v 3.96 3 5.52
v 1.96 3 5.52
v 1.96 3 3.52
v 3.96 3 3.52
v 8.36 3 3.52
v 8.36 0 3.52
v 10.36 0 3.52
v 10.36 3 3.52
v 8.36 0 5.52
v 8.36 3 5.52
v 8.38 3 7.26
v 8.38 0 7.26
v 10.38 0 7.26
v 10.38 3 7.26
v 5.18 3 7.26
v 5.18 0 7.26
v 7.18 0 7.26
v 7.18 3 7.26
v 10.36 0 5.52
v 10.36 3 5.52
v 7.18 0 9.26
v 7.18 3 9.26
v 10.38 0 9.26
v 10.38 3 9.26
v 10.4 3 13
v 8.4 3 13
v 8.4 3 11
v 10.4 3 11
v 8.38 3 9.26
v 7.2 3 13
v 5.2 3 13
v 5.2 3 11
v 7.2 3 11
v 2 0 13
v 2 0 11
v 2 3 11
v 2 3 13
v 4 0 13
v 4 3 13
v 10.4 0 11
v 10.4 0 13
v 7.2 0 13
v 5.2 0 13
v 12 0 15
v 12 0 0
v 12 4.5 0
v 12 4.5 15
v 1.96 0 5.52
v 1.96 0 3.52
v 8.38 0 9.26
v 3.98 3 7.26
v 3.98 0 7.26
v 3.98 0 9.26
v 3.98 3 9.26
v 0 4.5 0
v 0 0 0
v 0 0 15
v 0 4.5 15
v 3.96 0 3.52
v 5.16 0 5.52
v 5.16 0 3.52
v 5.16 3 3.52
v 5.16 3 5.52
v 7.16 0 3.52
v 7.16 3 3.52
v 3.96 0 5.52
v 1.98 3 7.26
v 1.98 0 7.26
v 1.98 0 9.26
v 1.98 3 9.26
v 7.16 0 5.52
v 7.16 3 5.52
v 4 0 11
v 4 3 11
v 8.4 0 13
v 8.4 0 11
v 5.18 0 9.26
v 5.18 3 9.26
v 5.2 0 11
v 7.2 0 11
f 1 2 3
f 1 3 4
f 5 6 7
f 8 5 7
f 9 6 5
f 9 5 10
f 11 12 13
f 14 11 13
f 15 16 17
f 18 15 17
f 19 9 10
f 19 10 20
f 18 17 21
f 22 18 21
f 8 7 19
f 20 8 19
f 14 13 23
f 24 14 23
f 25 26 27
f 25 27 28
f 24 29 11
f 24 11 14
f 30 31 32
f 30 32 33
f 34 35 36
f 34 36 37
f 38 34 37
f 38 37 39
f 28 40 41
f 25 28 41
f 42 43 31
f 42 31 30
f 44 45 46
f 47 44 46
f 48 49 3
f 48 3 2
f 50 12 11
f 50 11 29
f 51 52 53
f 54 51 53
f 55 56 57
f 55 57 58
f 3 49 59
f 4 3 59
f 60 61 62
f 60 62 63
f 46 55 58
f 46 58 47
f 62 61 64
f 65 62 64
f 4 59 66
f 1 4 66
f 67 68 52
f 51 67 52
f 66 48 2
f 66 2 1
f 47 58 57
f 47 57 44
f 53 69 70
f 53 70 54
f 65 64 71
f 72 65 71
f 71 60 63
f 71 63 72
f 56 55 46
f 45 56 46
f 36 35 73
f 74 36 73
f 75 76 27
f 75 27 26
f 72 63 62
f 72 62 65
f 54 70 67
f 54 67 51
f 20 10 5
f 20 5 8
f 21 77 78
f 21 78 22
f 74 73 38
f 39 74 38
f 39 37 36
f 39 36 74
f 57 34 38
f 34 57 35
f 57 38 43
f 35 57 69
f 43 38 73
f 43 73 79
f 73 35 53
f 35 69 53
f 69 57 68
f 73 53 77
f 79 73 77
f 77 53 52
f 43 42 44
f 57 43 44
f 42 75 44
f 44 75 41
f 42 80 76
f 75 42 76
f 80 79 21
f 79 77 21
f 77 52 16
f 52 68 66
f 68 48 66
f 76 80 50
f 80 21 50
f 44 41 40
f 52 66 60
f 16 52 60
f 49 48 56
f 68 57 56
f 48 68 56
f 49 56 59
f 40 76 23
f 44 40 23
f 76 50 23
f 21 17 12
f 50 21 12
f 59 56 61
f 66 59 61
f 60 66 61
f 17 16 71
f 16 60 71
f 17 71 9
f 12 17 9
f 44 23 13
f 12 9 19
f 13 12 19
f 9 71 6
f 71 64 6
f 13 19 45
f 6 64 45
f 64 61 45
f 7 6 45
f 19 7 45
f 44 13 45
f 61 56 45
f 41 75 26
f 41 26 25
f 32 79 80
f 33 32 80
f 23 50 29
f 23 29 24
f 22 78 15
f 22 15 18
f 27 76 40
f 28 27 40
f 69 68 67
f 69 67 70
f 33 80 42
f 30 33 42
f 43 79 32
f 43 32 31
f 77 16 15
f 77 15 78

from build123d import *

# Parameters (mm, degrees)
F0_W     = 12
F0_H     = 4.5
F1_DEPTH = 15
F2_W     = 2
F2_H     = 2
F3_DEPTH = 3


with BuildPart() as f1:
    # F0 (on Top) → F1 (new body)
    with BuildSketch(Plane.XY):
        with Locations((6, 2.25)):
            Rectangle(F0_W, F0_H)
    extrude(amount=F1_DEPTH)

    # F2 (on face) → F3 (cut)
    with BuildSketch(Plane.XZ):
        with Locations((3, 12)):
            Rectangle(F2_W, F2_H)
        with Locations((6.2, 12)):
            Rectangle(F2_W, F2_H)
        with Locations((9.4, 12)):
            Rectangle(F2_W, F2_H)
        with Locations((2.98, 8.26)):
            Rectangle(F2_W, F2_H)
        with Locations((6.18, 8.26)):
            Rectangle(F2_W, F2_H)
        with Locations((9.38, 8.26)):
            Rectangle(F2_W, F2_H)
        with Locations((2.96, 4.52)):
            Rectangle(F2_W, F2_H)
        with Locations((6.16, 4.52)):
            Rectangle(F2_W, F2_H)
        with Locations((9.36, 4.52)):
            Rectangle(F2_W, F2_H)
    extrude(amount=-F3_DEPTH, mode=Mode.SUBTRACT)


solid = f1.part
